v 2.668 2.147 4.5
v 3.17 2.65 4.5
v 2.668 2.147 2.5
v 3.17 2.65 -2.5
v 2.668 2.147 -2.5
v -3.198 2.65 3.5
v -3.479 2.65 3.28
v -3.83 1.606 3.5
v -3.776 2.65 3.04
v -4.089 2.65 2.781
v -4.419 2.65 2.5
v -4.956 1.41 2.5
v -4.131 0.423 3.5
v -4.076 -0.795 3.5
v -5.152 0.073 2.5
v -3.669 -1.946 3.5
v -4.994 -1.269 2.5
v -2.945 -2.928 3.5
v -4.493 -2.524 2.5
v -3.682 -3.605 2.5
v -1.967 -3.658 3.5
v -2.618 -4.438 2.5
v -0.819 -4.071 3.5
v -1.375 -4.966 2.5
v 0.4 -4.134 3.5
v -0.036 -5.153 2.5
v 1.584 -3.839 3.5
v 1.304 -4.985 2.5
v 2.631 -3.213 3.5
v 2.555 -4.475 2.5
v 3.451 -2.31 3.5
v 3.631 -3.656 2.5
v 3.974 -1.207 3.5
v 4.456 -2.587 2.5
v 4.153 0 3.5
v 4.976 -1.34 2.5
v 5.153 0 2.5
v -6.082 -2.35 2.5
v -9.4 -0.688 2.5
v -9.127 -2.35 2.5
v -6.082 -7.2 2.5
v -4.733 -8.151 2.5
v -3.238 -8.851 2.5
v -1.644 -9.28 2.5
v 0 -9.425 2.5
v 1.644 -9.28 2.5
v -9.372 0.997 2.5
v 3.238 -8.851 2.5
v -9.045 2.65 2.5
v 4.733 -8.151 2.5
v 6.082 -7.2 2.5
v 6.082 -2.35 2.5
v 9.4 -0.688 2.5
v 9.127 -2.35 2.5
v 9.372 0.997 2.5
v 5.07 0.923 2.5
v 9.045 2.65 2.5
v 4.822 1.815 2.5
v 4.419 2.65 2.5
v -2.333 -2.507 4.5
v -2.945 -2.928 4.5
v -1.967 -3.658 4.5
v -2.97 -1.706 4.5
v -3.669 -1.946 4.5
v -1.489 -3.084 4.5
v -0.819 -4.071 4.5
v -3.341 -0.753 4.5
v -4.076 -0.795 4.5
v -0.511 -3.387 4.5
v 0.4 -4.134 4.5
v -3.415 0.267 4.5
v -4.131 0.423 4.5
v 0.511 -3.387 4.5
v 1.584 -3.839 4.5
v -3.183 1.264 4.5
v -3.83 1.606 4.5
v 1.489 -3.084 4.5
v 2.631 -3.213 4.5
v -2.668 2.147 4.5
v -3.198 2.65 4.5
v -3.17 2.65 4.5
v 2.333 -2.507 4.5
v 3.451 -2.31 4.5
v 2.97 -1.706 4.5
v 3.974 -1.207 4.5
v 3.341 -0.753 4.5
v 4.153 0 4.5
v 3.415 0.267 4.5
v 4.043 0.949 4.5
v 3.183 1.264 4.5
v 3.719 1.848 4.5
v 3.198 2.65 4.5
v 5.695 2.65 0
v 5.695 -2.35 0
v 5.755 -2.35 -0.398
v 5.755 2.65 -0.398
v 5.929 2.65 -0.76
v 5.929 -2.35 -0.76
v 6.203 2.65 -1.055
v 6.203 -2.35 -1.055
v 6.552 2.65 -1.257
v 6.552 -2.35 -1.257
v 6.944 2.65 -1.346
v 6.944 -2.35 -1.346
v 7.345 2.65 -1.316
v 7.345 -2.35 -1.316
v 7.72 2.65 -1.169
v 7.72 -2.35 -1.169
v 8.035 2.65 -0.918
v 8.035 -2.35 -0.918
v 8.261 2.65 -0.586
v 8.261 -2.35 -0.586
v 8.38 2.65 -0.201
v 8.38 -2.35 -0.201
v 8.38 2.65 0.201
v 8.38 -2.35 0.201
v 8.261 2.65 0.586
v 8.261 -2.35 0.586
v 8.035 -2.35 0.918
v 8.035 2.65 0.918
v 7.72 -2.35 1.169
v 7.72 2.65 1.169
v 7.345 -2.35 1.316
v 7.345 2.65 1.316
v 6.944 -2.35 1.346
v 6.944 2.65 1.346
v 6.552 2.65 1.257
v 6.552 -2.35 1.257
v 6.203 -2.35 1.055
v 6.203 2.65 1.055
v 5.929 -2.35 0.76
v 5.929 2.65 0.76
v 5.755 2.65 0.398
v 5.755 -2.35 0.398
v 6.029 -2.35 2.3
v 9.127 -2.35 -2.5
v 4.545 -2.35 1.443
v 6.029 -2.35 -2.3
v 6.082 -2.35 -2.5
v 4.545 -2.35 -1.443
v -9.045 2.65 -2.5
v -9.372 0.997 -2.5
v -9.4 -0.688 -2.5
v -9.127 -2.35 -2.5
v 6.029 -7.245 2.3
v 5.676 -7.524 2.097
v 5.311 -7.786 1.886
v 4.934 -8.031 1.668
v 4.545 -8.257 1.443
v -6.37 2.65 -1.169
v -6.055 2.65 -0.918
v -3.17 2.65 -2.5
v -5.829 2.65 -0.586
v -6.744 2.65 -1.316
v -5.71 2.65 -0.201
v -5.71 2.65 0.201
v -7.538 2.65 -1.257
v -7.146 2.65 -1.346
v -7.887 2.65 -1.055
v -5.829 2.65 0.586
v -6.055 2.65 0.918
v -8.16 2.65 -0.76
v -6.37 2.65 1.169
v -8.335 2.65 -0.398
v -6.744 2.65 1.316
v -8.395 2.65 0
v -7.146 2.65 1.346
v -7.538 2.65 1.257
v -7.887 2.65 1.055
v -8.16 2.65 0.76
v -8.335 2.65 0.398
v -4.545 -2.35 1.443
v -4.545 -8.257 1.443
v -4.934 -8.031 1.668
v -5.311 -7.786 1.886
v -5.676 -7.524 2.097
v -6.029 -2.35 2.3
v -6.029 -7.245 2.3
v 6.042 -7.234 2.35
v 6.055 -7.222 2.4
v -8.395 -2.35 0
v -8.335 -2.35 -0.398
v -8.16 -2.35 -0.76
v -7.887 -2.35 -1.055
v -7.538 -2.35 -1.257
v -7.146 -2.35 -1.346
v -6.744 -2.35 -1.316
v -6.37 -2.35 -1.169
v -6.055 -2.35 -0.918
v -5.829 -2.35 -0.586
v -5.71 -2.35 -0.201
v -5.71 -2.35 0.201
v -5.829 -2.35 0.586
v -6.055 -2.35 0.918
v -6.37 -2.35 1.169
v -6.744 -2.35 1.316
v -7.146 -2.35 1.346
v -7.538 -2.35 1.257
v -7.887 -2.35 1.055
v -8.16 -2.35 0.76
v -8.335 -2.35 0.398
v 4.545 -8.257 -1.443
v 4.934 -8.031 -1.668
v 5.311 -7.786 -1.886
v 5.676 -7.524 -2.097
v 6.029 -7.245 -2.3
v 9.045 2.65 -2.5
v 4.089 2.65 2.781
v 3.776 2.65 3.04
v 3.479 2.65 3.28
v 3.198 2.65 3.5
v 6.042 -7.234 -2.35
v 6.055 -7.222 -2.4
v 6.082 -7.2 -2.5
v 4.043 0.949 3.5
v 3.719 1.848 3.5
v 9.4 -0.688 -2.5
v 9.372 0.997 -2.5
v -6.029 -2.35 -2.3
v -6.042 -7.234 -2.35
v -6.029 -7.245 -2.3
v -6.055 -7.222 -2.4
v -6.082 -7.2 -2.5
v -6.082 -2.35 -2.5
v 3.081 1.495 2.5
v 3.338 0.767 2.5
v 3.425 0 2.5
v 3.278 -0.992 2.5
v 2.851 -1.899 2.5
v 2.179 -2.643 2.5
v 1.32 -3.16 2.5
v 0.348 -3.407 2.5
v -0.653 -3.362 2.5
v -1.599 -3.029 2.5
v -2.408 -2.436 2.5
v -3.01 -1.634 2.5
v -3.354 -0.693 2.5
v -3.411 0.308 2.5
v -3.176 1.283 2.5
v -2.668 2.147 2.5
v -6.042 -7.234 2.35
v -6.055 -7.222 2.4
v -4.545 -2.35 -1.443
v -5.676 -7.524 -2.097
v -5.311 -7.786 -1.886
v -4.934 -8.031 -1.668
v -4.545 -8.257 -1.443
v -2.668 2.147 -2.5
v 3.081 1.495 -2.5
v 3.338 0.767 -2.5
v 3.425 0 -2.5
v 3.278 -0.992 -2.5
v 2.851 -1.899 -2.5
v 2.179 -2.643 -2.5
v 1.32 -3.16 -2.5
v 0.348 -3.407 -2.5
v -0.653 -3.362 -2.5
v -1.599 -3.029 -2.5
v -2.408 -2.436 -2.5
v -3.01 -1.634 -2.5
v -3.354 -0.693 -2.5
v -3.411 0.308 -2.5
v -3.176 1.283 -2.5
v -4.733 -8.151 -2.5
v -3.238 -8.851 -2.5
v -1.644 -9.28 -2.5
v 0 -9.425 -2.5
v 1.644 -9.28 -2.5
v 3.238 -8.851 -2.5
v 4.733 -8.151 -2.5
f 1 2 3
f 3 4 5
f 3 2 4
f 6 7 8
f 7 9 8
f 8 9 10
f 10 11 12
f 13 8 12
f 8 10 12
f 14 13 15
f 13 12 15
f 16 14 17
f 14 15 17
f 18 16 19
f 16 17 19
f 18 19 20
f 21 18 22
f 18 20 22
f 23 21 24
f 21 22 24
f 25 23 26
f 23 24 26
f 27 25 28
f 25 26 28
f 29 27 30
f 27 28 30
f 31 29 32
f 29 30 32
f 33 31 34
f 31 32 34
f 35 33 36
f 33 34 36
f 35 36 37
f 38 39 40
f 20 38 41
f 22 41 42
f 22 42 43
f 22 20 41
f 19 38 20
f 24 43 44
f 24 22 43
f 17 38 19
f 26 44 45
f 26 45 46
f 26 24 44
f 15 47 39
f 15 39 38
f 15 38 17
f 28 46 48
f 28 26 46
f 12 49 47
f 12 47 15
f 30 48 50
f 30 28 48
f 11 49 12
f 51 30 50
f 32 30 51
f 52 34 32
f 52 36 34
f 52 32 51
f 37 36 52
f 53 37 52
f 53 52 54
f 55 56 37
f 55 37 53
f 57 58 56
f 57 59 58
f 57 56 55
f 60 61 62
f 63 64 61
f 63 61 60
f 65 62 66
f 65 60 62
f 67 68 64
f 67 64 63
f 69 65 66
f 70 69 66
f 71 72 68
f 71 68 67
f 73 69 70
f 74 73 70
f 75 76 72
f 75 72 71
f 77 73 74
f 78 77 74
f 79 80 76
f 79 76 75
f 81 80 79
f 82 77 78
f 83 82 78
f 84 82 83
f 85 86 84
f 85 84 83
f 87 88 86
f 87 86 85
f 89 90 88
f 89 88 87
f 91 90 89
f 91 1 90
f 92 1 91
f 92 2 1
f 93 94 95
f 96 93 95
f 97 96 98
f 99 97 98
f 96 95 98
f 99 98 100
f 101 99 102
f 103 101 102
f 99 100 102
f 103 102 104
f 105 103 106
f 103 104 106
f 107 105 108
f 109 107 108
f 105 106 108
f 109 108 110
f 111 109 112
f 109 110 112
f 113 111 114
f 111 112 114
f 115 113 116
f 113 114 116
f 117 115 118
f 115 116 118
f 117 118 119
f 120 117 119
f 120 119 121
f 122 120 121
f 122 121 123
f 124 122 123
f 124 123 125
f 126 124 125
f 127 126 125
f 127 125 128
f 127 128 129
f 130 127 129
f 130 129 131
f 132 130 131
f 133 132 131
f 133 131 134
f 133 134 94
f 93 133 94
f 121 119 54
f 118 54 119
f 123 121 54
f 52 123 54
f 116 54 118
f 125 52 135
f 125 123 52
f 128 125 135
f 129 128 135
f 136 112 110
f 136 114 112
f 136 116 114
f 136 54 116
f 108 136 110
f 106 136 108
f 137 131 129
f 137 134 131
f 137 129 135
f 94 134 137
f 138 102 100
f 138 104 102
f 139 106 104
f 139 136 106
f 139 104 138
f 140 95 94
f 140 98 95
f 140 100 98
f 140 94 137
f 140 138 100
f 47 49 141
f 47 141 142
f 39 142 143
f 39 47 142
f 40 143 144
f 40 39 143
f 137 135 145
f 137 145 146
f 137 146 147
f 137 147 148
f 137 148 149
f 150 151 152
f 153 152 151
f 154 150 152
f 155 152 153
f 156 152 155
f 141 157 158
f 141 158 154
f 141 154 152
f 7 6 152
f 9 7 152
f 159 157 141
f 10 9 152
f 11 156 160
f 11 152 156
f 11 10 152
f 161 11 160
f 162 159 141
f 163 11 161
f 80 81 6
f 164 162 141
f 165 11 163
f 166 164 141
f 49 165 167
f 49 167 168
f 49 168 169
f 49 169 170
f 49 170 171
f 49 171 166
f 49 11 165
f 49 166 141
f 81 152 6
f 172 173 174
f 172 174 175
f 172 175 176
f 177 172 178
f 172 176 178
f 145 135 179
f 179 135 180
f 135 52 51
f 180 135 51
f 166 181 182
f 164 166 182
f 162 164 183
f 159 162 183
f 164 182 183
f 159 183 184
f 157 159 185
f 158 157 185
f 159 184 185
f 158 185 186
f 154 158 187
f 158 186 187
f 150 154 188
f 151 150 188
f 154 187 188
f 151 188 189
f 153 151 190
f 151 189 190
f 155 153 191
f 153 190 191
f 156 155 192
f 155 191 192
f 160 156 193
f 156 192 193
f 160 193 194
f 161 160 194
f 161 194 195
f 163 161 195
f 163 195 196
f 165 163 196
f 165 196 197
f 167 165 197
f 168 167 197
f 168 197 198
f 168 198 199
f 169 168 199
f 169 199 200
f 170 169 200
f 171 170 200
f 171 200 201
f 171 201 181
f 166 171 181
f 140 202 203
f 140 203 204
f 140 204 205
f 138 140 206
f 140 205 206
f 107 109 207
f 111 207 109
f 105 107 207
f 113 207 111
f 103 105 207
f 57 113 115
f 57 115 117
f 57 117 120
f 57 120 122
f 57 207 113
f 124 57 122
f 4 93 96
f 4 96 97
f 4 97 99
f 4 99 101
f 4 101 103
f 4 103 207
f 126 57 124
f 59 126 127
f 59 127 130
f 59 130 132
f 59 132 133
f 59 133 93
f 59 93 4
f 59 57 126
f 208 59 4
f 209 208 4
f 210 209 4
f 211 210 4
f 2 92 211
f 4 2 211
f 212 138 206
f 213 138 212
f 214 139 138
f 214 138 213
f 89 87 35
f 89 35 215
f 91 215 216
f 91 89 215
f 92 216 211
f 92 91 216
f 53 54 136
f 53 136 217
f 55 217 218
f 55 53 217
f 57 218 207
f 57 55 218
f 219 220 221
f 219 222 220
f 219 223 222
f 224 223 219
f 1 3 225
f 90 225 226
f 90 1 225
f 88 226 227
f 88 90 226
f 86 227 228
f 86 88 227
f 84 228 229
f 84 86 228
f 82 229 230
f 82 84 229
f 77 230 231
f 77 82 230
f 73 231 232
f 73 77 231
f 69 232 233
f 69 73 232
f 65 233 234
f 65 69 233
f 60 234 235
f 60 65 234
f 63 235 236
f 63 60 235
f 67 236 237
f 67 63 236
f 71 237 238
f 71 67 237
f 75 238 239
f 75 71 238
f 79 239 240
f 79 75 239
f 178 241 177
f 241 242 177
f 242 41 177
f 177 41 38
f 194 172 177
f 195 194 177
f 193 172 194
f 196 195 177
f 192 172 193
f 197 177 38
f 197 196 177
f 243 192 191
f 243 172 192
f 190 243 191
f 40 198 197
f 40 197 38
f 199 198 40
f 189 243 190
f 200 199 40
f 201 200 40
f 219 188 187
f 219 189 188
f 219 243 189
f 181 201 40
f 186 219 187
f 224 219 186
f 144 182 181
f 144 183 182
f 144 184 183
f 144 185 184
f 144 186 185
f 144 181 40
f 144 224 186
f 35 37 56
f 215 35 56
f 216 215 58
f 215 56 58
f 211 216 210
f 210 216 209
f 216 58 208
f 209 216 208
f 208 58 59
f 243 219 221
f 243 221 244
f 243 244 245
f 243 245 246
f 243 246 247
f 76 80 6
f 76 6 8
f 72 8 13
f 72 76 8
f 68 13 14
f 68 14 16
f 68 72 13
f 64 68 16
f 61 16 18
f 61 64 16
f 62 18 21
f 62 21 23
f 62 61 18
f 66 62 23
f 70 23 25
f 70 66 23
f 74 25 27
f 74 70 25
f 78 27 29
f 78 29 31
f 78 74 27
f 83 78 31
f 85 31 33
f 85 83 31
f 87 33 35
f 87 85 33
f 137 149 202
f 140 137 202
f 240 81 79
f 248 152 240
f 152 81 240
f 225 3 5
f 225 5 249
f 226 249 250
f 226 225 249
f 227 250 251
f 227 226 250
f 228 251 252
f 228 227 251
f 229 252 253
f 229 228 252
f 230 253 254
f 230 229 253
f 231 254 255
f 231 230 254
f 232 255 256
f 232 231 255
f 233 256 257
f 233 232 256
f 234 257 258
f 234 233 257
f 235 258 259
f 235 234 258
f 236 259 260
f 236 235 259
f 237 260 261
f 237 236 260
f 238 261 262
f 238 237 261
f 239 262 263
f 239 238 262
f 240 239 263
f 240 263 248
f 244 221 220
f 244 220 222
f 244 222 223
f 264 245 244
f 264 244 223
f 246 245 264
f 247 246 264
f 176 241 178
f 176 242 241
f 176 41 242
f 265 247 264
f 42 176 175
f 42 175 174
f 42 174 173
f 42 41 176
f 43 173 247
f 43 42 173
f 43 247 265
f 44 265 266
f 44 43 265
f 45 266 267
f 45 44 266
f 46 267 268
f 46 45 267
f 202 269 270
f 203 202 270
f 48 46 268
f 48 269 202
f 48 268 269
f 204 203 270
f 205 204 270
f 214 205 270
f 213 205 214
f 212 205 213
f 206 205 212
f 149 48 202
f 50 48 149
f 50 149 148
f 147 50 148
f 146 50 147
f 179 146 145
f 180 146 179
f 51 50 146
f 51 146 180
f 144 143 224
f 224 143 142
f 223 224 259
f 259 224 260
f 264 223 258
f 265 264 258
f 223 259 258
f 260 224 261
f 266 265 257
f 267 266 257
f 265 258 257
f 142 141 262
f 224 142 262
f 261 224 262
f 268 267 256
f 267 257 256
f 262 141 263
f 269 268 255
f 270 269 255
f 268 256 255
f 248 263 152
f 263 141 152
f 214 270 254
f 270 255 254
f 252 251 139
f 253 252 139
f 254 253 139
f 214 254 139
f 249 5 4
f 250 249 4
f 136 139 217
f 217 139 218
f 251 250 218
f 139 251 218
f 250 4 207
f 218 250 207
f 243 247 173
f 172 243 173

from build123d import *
from OCP.BRepFilletAPI import BRepFilletAPI_MakeChamfer

# Parameters (mm, degrees)
BOSS_EXTRUDE1_DEPTH    = 2.5
BOSS_EXTRUDE2_START    = 2
BOSS_EXTRUDE2_DEPTH    = 2
CHAMFER1_SIZE          = 1
CHAMFER2_SIZE          = 1
M2_5_CLEARANCE_HOLE1_D = 2.7
CUT_EXTRUDE1_DEPTH     = 7.074630657
CHAMFER3_SIZE          = 0.4
CHAMFER3_SIZE2         = 0.292820323
CHAMFER4_SIZE          = 0.4
CHAMFER4_SIZE2         = 0.292820323
CHAMFER5_SIZE          = 1


with BuildPart() as part:
    # Sketch1 → Boss-Extrude1 (new, symmetric)
    with BuildSketch(Plane.XY):
        with BuildLine():
            Line((9.044892613, 2.649630657), (2.170272421, 2.649630657))
            ThreePointArc((2.170272421, 2.649630657), (3.095465073, 1.465851622), (3.425, 0))
            ThreePointArc((3.425, 0), (-1.465851622, -3.095465073), (-2.170272421, 2.649630657))
            Line((-2.170272421, 2.649630657), (-9.044892613, 2.649630657))
            ThreePointArc((-9.044892613, 2.649630657), (0, -9.425), (9.044892613, 2.649630657))
        make_face()
    extrude(amount=BOSS_EXTRUDE1_DEPTH, both=True)

    # Sketch2 → Boss-Extrude2 (add)
    with BuildSketch(Plane.XY.offset(2.5).offset(BOSS_EXTRUDE2_START)):
        with BuildLine():
            ThreePointArc((4.1529, 0), (3.906839776, 1.408254726), (3.197817348, 2.649630657))
            Line((3.197817348, 2.649630657), (2.170272421, 2.649630657))
            ThreePointArc((2.170272421, 2.649630657), (0, -3.425), (-2.170272421, 2.649630657))
            Line((-2.170272421, 2.649630657), (-3.197817348, 2.649630657))
            ThreePointArc((-3.197817348, 2.649630657), (-1.408254726, -3.906839776), (4.1529, 0))
        make_face()
    extrude(amount=-BOSS_EXTRUDE2_DEPTH)

    # Chamfer1
    # the kernel refuses this chamfer: 1, 0.710595202 mm, written as the material it takes off along each edge
    with BuildSketch(Plane(origin=(-2.170272421, 2.649630657, -5.071682988), x_dir=(-1, 0, 0), z_dir=(0, 0, 1))) as chamfer1_piece_1:
        with BuildLine():
            Line((CHAMFER1_SIZE, 0), (0.497857743, 0.502142257))
            ThreePointArc((0.497857743, 0.502142257), (0.261983404, 0.238250015), (0, 0))
            Line((0, 0), (CHAMFER1_SIZE, 0))
        make_face()
    extrude(amount=12.143365976, mode=Mode.SUBTRACT)

    # Chamfer2
    # the kernel refuses this chamfer: 1, 0.710595202 mm, written as the material it takes off along each edge
    with BuildSketch(Plane(origin=(2.170272421, 2.649630657, -5.071682988), x_dir=(1, 0, 0), z_dir=(0, 0, 1))) as chamfer2_piece_1:
        with BuildLine():
            Line((CHAMFER2_SIZE, 0), (0.497857743, -0.502142257))
            ThreePointArc((0.497857743, -0.502142257), (0.261983404, -0.238250015), (0, 0))
            Line((0, 0), (CHAMFER2_SIZE, 0))
        make_face()
    extrude(amount=12.143365976, mode=Mode.SUBTRACT)

    # M2.5 Clearance Hole1 (through all)
    with Locations(Plane(origin=(0, 2.649630657, 0), x_dir=(1, 0, 0), z_dir=(0, 1, 0))):
        with Locations((-7.044892613, 0), (7.044892613, 0)):
            Hole(M2_5_CLEARANCE_HOLE1_D / 2)

    # Sketch5 → Cut-Extrude1 (cut)
    with BuildSketch(Plane(origin=(0, -9.425, 0), x_dir=(-1, 0, 0), z_dir=(0, -1, 0))):
        Polygon((-12.044892613, 2.886751346), (-12.044892613, -2.886751346), (-7.044892613, -2.886751346), (-9.544892613, -1.443375673), (-9.544892613, 1.443375673), (-7.044892613, 2.886751346), align=None)
        Polygon((-4.544892613, 1.443375673), (-7.044892613, 2.886751346), (-9.544892613, 1.443375673), (-9.544892613, -1.443375673), (-7.044892613, -2.886751346), (-4.544892613, -1.443375673), align=None)
        Polygon((4.544892613, -1.443375673), (7.044892613, -2.886751346), (9.544892613, -1.443375673), (9.544892613, 1.443375673), (7.044892613, 2.886751346), (4.544892613, 1.443375673), align=None)
        Polygon((12.044892613, -2.886751346), (7.044892613, -2.886751346), (9.544892613, -1.443375673), (9.544892613, 1.443375673), (7.044892613, 2.886751346), (12.044892613, 2.886751346), align=None)
    extrude(amount=-CUT_EXTRUDE1_DEPTH, mode=Mode.SUBTRACT)

    # Chamfer3: one chamfer whose edges measure the first distance from different faces: ONE call of the kernel's chamfer builder (chamfer() names one face for all edges)
    chamfer3_edges_1 = [part.edges().sort_by_distance(p)[0] for p in [
        (6.375019632, -4.646126535, 2.5),
    ]]
    chamfer3_side_1 = [part.faces().sort_by_distance(p)[0] for p in [
        (5.422316201, -5.016137367, 1.949956418),
    ]]
    chamfer3_edges_2 = [part.edges().sort_by_distance(p)[0] for p in [
        (-6.375019632, -4.646126535, 2.5),
    ]]
    chamfer3_side_2 = [part.faces().sort_by_distance(p)[0] for p in [
        (-5.422316201, -5.016137367, 1.949956418),
    ]]
    chamfer3 = BRepFilletAPI_MakeChamfer(part.part.solid().wrapped)
    for e in chamfer3_edges_1:
        chamfer3.Add(CHAMFER3_SIZE, CHAMFER3_SIZE2, e.wrapped, chamfer3_side_1[0].wrapped)  # the first distance lies on this face
    for e in chamfer3_edges_2:
        chamfer3.Add(CHAMFER3_SIZE, CHAMFER3_SIZE2, e.wrapped, chamfer3_side_2[0].wrapped)  # the first distance lies on this face
    add(Compound.cast(chamfer3.Shape()), mode=Mode.REPLACE)

    # Chamfer4: one chamfer whose edges measure the first distance from different faces: ONE call of the kernel's chamfer builder (chamfer() names one face for all edges)
    chamfer4_edges_1 = [part.edges().sort_by_distance(p)[0] for p in [
        (6.375019632, -4.646126535, -2.5),
    ]]
    chamfer4_side_1 = [part.faces().sort_by_distance(p)[0] for p in [
        (5.422316201, -5.016137367, -1.949956418),
    ]]
    chamfer4_edges_2 = [part.edges().sort_by_distance(p)[0] for p in [
        (-6.375019632, -4.646126535, -2.5),
    ]]
    chamfer4_side_2 = [part.faces().sort_by_distance(p)[0] for p in [
        (-5.422316201, -5.016137367, -1.949956418),
    ]]
    chamfer4 = BRepFilletAPI_MakeChamfer(part.part.solid().wrapped)
    for e in chamfer4_edges_1:
        chamfer4.Add(CHAMFER4_SIZE, CHAMFER4_SIZE2, e.wrapped, chamfer4_side_1[0].wrapped)  # the first distance lies on this face
    for e in chamfer4_edges_2:
        chamfer4.Add(CHAMFER4_SIZE, CHAMFER4_SIZE2, e.wrapped, chamfer4_side_2[0].wrapped)  # the first distance lies on this face
    add(Compound.cast(chamfer4.Shape()), mode=Mode.REPLACE)

    # Chamfer5
    chamfer5_edges = [part.edges().sort_by_distance(p)[0] for p in [
        (-1.408254726, -3.906839776, 2.5),
    ]]
    chamfer(chamfer5_edges, length=CHAMFER5_SIZE)


solid = part.part
